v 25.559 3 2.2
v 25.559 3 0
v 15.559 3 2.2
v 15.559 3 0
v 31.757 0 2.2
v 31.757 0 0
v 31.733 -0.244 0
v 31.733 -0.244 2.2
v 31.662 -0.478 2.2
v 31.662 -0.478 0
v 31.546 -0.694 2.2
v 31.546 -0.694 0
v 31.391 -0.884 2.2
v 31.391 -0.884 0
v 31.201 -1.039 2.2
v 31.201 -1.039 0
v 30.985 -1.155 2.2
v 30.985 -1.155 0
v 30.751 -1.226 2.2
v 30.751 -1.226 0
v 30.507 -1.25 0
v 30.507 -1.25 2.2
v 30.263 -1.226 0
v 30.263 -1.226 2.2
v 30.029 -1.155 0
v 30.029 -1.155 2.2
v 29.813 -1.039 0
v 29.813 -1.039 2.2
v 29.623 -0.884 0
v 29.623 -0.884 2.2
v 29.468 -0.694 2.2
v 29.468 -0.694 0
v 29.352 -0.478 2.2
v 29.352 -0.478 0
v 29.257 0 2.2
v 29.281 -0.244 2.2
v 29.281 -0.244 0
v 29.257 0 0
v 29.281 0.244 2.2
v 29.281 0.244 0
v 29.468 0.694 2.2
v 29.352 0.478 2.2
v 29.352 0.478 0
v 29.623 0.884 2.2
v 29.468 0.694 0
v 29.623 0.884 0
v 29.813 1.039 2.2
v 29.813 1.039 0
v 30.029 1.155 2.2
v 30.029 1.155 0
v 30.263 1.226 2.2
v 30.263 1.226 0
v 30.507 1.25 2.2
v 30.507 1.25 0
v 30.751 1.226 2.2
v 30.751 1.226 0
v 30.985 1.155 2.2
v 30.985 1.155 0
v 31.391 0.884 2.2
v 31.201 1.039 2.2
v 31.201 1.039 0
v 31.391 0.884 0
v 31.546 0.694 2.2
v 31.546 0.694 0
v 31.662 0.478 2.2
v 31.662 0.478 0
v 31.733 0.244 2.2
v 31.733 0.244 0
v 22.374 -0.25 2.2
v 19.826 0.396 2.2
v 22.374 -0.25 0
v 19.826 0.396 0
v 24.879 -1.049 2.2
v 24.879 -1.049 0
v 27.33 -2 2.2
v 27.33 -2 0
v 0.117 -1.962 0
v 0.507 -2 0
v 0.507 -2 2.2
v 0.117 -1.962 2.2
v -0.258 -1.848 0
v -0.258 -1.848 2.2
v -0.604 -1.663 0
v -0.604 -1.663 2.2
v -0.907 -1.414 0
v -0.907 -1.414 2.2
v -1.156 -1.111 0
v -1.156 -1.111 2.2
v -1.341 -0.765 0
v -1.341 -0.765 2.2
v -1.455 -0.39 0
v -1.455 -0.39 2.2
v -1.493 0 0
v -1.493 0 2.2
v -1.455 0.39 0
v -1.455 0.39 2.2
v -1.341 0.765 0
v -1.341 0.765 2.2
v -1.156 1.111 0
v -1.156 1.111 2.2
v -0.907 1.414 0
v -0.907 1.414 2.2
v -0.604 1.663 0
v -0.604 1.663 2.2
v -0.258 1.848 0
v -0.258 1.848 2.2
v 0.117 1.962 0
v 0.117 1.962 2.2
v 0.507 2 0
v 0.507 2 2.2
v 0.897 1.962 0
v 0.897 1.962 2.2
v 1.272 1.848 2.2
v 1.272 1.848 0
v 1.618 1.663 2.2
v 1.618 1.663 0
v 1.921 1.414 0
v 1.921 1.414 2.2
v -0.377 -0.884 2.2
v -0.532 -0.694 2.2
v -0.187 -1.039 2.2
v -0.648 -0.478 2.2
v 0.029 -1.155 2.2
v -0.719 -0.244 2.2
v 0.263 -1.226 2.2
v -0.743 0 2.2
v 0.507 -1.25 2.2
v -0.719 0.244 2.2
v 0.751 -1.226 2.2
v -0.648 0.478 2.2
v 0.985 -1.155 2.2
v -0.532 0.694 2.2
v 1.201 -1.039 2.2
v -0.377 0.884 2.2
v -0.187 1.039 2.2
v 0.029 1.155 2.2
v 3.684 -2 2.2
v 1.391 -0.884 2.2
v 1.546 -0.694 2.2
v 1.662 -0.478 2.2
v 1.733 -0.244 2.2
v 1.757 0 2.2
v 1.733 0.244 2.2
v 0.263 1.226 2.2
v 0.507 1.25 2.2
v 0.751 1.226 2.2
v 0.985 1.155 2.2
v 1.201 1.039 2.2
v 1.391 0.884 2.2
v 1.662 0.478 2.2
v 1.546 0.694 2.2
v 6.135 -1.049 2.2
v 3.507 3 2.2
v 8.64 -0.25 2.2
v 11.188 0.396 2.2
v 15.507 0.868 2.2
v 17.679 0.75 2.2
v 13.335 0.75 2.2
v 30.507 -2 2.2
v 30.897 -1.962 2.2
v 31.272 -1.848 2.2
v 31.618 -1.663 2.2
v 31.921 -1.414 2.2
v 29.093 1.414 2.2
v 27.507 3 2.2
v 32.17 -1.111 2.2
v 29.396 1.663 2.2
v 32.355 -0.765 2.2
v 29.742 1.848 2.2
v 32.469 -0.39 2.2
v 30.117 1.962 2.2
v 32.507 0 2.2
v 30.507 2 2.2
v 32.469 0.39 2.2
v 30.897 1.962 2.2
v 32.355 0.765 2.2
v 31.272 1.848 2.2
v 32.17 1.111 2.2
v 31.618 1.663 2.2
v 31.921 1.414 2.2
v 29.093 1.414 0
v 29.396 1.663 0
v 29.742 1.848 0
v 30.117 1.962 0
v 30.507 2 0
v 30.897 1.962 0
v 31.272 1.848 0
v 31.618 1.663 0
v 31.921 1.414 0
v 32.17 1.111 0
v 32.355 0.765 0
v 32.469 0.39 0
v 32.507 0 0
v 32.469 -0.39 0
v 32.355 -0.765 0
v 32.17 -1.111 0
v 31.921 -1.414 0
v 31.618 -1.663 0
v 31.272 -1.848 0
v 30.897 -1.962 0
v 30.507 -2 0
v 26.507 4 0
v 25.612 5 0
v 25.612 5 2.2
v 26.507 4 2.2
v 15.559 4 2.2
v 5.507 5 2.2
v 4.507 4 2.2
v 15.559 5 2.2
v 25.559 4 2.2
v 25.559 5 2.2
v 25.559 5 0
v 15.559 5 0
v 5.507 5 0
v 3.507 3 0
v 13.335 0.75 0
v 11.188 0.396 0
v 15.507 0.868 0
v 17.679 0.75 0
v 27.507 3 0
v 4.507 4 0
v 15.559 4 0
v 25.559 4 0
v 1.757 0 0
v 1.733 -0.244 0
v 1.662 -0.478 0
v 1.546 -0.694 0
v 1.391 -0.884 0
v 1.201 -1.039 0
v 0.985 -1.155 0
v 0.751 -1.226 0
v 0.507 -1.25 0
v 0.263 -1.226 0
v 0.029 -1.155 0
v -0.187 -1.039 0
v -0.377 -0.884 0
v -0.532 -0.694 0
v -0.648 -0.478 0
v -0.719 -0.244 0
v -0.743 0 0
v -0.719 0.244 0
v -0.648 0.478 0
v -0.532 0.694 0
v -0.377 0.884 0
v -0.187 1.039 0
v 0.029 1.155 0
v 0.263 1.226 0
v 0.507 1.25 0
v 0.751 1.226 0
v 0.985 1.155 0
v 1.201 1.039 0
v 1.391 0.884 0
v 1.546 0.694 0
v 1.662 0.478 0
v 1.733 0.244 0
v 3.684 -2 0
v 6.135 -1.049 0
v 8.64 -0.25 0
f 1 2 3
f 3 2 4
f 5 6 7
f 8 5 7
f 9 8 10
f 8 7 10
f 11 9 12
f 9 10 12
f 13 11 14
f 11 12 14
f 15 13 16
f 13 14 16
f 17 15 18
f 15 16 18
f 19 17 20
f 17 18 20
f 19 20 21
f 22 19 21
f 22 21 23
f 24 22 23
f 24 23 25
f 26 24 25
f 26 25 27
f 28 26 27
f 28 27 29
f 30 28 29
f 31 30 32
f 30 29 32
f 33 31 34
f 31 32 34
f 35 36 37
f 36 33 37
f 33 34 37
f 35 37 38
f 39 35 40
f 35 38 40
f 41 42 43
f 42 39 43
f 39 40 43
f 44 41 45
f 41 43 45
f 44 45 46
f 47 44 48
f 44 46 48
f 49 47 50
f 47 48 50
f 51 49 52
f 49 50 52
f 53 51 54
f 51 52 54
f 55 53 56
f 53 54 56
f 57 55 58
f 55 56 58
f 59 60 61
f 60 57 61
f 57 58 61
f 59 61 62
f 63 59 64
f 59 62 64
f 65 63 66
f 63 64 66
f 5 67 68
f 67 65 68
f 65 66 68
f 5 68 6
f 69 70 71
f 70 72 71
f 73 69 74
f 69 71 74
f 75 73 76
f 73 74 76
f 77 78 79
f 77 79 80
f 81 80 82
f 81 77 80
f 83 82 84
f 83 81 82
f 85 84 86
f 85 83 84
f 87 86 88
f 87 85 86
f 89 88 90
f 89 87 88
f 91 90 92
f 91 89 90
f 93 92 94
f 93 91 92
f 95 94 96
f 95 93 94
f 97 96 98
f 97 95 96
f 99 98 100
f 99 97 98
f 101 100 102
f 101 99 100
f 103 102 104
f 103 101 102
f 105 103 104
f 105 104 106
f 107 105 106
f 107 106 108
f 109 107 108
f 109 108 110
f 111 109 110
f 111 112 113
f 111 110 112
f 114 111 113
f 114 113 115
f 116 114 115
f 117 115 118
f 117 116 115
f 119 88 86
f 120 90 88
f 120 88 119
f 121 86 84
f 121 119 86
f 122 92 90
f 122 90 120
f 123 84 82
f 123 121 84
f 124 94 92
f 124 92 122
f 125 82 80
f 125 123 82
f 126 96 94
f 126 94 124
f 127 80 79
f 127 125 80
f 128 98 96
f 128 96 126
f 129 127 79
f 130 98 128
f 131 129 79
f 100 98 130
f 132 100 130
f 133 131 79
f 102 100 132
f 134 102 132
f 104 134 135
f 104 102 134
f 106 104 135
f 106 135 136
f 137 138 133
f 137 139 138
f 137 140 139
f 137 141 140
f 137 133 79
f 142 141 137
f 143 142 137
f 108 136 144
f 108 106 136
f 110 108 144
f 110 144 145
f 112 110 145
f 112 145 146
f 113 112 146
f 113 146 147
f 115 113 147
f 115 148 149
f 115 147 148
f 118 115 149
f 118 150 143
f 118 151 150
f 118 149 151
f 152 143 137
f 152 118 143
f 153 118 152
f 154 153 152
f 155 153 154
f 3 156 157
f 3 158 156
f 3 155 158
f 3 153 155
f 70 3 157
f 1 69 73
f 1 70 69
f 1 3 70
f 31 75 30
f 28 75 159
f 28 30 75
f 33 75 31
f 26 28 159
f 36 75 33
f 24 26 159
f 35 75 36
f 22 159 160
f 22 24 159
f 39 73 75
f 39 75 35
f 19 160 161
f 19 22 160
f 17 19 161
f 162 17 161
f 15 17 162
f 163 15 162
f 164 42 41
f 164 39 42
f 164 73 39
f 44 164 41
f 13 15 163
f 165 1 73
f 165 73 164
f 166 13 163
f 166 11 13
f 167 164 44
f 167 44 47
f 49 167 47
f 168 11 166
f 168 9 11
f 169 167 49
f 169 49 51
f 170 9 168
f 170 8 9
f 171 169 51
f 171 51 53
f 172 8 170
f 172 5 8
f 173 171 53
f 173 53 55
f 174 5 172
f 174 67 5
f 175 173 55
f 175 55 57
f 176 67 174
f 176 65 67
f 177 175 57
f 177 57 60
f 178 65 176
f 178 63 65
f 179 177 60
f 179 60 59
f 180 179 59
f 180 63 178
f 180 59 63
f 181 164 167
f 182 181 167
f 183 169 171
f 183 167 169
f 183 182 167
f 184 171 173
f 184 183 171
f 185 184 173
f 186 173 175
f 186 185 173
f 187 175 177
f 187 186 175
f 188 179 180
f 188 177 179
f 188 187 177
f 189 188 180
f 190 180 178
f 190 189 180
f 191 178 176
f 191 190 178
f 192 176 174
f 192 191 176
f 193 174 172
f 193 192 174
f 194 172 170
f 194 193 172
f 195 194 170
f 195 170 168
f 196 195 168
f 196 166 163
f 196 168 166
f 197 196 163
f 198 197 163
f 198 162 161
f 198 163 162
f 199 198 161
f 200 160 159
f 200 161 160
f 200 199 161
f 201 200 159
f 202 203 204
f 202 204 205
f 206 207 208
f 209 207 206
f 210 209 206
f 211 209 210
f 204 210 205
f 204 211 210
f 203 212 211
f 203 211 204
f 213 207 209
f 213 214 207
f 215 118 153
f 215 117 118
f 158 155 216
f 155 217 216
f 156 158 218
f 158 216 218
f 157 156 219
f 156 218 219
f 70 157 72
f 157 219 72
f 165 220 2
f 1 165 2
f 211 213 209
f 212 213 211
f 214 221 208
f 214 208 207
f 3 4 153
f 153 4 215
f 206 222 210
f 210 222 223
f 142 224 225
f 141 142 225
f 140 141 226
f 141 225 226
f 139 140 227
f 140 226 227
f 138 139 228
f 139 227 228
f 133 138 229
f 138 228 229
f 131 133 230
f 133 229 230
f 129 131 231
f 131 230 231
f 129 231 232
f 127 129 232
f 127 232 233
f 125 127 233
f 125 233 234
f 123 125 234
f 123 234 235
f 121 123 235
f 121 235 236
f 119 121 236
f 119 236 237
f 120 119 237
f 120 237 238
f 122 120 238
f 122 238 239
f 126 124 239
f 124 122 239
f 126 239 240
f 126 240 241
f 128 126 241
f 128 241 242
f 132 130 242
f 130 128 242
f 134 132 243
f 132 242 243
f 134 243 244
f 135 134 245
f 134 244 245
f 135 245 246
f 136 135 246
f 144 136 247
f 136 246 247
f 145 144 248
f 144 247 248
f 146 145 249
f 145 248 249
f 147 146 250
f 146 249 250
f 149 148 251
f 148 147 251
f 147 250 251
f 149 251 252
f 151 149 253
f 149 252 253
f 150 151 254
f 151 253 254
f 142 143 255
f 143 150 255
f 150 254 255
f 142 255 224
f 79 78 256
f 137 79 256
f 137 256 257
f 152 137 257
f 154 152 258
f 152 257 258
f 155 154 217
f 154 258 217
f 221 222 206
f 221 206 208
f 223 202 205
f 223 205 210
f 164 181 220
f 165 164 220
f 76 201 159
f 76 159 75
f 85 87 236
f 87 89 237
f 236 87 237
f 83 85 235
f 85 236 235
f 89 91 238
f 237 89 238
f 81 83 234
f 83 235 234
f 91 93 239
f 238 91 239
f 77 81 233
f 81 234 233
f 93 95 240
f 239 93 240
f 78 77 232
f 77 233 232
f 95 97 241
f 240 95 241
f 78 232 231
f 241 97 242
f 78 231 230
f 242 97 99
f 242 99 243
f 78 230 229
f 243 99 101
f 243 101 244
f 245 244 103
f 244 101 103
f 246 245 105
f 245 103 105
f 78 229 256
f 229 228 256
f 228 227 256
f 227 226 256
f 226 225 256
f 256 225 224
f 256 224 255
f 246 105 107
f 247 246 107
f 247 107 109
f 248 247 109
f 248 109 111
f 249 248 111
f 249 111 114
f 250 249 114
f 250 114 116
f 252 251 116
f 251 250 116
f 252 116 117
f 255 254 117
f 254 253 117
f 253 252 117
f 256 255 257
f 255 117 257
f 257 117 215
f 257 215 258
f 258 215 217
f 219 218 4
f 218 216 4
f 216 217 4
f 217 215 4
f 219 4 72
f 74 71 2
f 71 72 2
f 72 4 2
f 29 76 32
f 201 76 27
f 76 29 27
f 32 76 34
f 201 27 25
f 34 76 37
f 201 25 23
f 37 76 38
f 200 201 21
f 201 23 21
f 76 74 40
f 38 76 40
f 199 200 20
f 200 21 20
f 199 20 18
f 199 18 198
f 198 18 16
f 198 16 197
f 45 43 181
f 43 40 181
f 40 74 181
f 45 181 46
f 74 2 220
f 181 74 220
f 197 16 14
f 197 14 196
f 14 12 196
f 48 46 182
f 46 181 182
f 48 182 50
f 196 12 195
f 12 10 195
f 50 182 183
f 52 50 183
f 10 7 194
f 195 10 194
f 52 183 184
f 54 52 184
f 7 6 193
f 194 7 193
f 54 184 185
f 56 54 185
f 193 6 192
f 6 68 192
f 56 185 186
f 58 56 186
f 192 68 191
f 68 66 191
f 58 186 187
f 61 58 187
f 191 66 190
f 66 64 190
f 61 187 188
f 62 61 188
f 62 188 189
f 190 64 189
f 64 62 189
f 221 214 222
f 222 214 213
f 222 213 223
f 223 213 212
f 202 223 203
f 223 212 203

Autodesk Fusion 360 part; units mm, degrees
sketch "Sketch1" plane through (0, 0, 0) normal (0, 0, 1) x (1, 0, 0)
  circle A0 centre (0.507, 0) radius 1.25
  line L0 (4.507, 4) -> (5.507, 5)
  arc A1 (1.9212, 1.4142) -> (0.507, -2) centre (0.507, 0) ccw
  line L1 (1.9212, 1.4142) -> (3.507, 3)
  line L2 (0.507, -2) -> (3.6836, -2)
  arc A2 (11.1884, 0.3961) -> (3.6836, -2) centre (20.507, -41.7412) ccw
  line L3 (26.507, 4) -> (25.5594, 4)
  line L4 (15.5594, 4) -> (4.507, 4)
  line L5 (4.507, 4) -> (15.5594, 4)
  line L6 (25.5594, 4) -> (26.507, 4)
  line L7 (5.507, 5) -> (15.5594, 5)
  line L8 (25.5594, 5) -> (25.6118, 5)
  line L9 (27.507, 3) -> (25.5594, 3)
  line L10 (15.5594, 3) -> (3.507, 3)
  arc A3 (27.3304, -2) -> (19.8257, 0.3961) centre (10.507, -41.7412) ccw
  line L11 (15.5594, 5) -> (25.6118, 5)
  circle A4 centre (30.507, 0) radius 1.25
  line L12 (27.507, 3) -> (15.5594, 3)
  line L13 (30.507, -2) -> (27.3304, -2)
  line L14 (25.6118, 5) -> (26.507, 4)
  line L15 (29.0928, 1.4142) -> (27.507, 3)
  line L16 (15.5594, 4) -> (26.507, 4)
  line L17 (26.507, 4) -> (15.5594, 4)
  line L18 (15.5594, 1.1297) -> (15.5594, 1.1174)
  arc A5 (30.507, -2) -> (29.0928, 1.4142) centre (30.507, 0) ccw
  arc A6 (19.8257, 0.3961) -> (11.1884, 0.3961) centre (15.507, -19.1321) ccw
  dimension "d3" = 2.5
  dimension "d5" = 1
  dimension "d7" = 4
  dimension "d9" = 1
  dimension "d18" = 2.5
  dimension "d19" = 4
  dimension "d20" = 20
extrude "Extrude3" add sketch "Sketch1" along normal blind 2.2 contours A1 L1 L2 A2 L9 L10 A3 L12 L13 L15 A5 A6 makes body 1
extrude "Extrude4" add sketch "Sketch1" along normal blind 2.2 separate body contours L0 L3 L4 L5 L6 L7 L8 L11 L14 L16 L17 makes body 2
